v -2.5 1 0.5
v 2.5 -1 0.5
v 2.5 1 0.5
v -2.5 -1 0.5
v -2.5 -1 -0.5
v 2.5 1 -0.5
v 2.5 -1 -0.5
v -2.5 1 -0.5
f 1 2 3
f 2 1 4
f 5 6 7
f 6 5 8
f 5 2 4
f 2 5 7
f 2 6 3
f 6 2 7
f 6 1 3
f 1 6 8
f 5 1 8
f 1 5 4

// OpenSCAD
module radar(){
        color("white")
     cube([5,2,1],center=true);
}

radar();
